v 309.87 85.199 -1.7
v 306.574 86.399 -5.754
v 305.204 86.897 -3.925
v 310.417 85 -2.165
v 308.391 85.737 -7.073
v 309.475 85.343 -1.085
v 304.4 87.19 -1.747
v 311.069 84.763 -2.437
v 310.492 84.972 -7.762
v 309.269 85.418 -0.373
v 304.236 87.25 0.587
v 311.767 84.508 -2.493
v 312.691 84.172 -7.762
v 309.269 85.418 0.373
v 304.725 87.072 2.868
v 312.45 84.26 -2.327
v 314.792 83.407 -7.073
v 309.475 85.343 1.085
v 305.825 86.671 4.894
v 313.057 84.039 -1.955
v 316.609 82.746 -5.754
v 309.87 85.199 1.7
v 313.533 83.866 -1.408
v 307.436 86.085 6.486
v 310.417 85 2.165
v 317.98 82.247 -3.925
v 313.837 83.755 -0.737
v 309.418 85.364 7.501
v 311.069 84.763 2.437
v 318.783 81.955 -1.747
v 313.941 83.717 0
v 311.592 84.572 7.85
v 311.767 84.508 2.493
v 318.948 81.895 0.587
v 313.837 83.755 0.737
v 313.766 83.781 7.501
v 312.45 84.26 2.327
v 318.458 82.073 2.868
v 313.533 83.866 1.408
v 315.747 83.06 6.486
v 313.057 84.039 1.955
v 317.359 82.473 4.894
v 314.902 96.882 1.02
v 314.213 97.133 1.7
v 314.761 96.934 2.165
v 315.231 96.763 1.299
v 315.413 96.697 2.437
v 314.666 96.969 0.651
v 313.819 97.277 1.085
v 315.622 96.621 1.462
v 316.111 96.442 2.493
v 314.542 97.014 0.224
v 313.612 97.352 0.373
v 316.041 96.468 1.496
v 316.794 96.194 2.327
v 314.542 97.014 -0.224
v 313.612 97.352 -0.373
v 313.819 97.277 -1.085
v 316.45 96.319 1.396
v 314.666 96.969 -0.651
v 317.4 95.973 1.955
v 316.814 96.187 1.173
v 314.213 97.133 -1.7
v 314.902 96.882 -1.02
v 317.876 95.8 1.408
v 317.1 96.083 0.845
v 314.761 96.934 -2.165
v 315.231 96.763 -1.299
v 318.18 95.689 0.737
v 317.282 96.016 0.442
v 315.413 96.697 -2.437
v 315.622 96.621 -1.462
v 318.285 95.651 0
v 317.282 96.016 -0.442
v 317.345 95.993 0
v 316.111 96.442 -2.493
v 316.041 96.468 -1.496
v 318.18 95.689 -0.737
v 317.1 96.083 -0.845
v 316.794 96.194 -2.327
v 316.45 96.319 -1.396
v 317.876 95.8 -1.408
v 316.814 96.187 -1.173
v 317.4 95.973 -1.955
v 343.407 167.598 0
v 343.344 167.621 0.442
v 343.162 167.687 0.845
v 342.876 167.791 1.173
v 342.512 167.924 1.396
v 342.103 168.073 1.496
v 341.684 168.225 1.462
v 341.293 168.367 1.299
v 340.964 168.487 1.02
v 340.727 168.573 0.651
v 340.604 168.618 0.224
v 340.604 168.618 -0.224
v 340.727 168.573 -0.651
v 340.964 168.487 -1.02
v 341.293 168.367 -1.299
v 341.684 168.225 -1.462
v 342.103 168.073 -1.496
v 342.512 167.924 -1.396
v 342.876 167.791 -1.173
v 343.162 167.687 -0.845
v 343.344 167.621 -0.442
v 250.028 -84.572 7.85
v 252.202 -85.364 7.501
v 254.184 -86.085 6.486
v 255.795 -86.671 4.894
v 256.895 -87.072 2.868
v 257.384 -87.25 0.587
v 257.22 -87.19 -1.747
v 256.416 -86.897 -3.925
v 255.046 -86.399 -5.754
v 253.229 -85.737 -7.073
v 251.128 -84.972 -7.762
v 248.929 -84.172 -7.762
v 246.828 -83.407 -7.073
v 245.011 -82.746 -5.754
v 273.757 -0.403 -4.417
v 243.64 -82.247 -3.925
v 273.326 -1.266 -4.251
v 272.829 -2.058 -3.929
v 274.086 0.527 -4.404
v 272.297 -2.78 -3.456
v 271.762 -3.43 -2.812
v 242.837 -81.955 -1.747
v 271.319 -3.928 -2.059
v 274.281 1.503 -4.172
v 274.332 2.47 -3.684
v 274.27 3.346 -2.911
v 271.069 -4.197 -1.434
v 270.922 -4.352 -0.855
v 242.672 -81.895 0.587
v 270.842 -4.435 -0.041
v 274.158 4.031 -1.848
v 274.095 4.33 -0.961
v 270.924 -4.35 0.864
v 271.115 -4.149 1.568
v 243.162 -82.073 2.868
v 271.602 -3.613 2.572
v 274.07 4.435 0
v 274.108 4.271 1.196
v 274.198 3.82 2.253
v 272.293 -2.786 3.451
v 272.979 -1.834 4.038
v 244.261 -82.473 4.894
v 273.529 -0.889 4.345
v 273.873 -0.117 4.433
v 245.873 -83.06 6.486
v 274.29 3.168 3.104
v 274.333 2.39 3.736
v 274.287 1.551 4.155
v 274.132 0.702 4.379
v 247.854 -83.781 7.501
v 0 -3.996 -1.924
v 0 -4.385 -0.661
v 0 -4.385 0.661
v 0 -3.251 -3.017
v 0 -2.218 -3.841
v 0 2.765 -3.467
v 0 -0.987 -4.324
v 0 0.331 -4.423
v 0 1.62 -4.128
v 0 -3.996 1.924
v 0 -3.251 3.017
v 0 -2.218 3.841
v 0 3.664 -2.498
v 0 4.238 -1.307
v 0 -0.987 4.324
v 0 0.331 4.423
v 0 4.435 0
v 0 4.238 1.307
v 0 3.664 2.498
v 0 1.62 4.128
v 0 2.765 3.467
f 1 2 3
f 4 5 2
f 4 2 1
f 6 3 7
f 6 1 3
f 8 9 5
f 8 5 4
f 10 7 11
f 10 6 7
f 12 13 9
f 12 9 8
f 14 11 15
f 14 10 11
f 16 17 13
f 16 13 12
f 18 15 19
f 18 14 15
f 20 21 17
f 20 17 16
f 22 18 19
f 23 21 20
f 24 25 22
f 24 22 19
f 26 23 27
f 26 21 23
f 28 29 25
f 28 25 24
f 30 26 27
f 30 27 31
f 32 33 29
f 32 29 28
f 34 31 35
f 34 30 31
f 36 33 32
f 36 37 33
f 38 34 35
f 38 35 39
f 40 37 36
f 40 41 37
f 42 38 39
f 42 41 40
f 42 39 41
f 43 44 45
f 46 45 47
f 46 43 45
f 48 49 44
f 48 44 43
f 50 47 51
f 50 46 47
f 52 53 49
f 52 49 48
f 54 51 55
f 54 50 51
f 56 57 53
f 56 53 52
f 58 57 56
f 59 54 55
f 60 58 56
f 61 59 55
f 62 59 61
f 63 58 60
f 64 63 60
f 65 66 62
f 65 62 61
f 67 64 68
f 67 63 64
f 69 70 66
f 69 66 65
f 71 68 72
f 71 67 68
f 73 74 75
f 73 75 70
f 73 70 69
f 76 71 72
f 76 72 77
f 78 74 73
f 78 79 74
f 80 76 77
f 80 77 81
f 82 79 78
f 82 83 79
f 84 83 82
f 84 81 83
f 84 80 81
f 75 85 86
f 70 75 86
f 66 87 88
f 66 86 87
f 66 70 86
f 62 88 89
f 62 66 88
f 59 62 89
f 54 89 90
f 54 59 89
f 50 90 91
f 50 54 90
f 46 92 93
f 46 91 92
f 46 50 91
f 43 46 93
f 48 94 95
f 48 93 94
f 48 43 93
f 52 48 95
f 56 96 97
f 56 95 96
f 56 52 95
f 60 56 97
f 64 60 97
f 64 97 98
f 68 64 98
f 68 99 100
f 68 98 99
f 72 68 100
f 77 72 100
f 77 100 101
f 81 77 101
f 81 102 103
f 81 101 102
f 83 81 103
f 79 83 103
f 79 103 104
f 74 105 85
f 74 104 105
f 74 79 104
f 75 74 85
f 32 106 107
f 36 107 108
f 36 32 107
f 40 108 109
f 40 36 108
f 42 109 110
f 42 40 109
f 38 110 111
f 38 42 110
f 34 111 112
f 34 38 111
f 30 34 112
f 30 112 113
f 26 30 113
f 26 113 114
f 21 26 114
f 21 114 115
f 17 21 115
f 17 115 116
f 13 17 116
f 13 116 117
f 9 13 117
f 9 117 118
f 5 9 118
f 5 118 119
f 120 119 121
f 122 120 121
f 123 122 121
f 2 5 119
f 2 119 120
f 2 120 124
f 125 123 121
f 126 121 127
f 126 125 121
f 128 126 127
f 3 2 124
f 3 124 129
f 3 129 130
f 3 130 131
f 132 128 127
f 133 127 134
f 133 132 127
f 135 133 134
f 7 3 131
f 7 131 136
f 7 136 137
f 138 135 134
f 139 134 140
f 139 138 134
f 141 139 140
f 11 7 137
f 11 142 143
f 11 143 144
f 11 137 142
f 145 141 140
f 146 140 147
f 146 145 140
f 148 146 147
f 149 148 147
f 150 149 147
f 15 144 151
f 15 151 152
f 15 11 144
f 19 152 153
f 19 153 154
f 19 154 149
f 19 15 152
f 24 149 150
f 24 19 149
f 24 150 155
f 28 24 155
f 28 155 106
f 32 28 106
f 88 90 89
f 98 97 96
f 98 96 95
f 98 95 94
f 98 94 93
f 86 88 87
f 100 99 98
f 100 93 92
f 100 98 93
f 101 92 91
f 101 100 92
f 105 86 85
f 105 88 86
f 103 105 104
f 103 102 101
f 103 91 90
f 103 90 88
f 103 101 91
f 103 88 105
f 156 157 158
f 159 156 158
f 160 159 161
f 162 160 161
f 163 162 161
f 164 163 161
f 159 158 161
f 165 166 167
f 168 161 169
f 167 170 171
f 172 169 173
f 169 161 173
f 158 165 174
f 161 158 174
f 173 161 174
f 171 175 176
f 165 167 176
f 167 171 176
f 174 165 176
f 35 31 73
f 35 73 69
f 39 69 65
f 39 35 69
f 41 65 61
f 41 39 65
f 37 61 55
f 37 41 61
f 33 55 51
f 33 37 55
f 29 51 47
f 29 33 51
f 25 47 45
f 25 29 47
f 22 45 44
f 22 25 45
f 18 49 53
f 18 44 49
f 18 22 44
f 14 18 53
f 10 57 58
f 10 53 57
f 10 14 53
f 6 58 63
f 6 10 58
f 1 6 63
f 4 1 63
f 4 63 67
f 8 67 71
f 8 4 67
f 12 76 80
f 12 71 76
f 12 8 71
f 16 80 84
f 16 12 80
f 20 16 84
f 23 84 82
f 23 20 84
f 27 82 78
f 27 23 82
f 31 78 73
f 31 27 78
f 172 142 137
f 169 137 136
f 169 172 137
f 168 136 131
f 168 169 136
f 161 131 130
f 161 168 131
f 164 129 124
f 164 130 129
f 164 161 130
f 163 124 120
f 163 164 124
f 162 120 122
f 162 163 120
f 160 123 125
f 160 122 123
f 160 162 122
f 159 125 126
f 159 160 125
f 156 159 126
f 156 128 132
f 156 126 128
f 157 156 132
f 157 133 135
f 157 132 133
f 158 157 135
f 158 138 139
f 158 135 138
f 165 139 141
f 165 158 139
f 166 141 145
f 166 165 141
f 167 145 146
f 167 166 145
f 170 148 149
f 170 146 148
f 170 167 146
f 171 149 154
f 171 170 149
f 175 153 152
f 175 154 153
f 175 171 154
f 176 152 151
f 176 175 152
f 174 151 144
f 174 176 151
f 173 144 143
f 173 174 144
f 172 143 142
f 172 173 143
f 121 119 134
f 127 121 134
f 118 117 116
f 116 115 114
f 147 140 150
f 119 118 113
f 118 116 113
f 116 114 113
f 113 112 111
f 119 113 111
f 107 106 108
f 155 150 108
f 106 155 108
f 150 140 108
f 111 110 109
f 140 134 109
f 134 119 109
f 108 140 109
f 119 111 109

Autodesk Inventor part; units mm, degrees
ref_plane "YZ Plane" through (0, 0, 0) normal (1, 0, 0) x (0, 1, 0)
ref_plane "XZ Plane" through (0, 0, 0) normal (0, 1, 0) x (-1, 0, 0)
ref_plane "XY Plane" through (0, 0, 0) normal (0, 0, 1) x (1, 0, 0)
sketch "Sketch1" plane through (0, 0, 0) normal (1, 0, 0) x (0, 1, 0)
  circle A0 centre (0, 0) radius 4.435
  dimension "d0" = 8.87
extrude "Extrusion1" add sketch "Sketch1" along normal blind 280.8
sketch "Sketch2" plane through (280.8, 0, 0) normal (1, 0, 0) x (0, 0, -1)
  circle A0 centre (0, 0) radius 4.435 projected
  line L0 (0, 0) -> (8.3226, 0)
  line L1 (0.8914, 0) -> (-7.5966, 0)
  arc A1 (-4.435, 0) -> (4.435, 0) centre (0, 0) ccw
extrude "Extrusion2" add sketch "Sketch2" along normal blind 0.01 contours A0 L1 L0 picked at (-2.4155, -1.6673)
ref_plane "Work Plane1" through (280.81, 0, 0) normal (0.3420201, 0.9396926, 0) x (0, 0, 1)
sketch "Sketch4" plane through (280.81, 0, 0) normal (0.3420201, 0.9396926, 0) x (0, 0, 1)
  line L0 (4.435, -0.0094) -> (-4.435, -0.0094) projected
  ellipse E0 centre (0, -0.0094) end of major axis (-4.435, -0.0094) minor radius 1.5169 (-4.435, -0.0094) -> (4.435, -0.0094) ccw projected
  line L1 (-4.435, 0) -> (4.435, 0) projected
  ellipse E1 centre (0, 0) end of major axis (-4.435, 0) minor radius 1.5169 (4.435, 0) -> (-4.435, 0) ccw projected
  circle A0 centre (0, 0) radius 7.85
  point P0 (0, -263.8751)
  dimension "d11" = 15.7
extrude "Extrusion4" add sketch "Sketch4" along normal blind 90 and the other way blind 90 contours E0 L0 | E1 L1 | A0
sketch "Sketch6" plane through (311.5918, 84.5723, 0) normal (0.3420201, 0.9396926, 0) x (0.9396926, -0.3420201, 0)
  circle A0 centre (0, 0) radius 7.85 projected
  circle A1 centre (0, 0) radius 1 projected
  circle A2 centre (0, 0) radius 2.5
  point P0 (-263.8751, 0)
  dimension "d19" = 5
extrude "Extrusion6" add sketch "Sketch6" along normal blind 12.7 contours A1 | A2
sketch "Sketch7" plane through (315.9355, 96.5064, 0) normal (0.3420201, 0.9396926, 0) x (0.9396926, -0.3420201, 0)
  circle A0 centre (0, 0) radius 2.5 projected
  circle A1 centre (0, 0) radius 1.5
  point P0 (-263.8751, 0)
  dimension "d22" = 3
extrude "Extrusion7" add sketch "Sketch7" along normal blind 76.2 contours A1
properties part number "Piston_Model"
